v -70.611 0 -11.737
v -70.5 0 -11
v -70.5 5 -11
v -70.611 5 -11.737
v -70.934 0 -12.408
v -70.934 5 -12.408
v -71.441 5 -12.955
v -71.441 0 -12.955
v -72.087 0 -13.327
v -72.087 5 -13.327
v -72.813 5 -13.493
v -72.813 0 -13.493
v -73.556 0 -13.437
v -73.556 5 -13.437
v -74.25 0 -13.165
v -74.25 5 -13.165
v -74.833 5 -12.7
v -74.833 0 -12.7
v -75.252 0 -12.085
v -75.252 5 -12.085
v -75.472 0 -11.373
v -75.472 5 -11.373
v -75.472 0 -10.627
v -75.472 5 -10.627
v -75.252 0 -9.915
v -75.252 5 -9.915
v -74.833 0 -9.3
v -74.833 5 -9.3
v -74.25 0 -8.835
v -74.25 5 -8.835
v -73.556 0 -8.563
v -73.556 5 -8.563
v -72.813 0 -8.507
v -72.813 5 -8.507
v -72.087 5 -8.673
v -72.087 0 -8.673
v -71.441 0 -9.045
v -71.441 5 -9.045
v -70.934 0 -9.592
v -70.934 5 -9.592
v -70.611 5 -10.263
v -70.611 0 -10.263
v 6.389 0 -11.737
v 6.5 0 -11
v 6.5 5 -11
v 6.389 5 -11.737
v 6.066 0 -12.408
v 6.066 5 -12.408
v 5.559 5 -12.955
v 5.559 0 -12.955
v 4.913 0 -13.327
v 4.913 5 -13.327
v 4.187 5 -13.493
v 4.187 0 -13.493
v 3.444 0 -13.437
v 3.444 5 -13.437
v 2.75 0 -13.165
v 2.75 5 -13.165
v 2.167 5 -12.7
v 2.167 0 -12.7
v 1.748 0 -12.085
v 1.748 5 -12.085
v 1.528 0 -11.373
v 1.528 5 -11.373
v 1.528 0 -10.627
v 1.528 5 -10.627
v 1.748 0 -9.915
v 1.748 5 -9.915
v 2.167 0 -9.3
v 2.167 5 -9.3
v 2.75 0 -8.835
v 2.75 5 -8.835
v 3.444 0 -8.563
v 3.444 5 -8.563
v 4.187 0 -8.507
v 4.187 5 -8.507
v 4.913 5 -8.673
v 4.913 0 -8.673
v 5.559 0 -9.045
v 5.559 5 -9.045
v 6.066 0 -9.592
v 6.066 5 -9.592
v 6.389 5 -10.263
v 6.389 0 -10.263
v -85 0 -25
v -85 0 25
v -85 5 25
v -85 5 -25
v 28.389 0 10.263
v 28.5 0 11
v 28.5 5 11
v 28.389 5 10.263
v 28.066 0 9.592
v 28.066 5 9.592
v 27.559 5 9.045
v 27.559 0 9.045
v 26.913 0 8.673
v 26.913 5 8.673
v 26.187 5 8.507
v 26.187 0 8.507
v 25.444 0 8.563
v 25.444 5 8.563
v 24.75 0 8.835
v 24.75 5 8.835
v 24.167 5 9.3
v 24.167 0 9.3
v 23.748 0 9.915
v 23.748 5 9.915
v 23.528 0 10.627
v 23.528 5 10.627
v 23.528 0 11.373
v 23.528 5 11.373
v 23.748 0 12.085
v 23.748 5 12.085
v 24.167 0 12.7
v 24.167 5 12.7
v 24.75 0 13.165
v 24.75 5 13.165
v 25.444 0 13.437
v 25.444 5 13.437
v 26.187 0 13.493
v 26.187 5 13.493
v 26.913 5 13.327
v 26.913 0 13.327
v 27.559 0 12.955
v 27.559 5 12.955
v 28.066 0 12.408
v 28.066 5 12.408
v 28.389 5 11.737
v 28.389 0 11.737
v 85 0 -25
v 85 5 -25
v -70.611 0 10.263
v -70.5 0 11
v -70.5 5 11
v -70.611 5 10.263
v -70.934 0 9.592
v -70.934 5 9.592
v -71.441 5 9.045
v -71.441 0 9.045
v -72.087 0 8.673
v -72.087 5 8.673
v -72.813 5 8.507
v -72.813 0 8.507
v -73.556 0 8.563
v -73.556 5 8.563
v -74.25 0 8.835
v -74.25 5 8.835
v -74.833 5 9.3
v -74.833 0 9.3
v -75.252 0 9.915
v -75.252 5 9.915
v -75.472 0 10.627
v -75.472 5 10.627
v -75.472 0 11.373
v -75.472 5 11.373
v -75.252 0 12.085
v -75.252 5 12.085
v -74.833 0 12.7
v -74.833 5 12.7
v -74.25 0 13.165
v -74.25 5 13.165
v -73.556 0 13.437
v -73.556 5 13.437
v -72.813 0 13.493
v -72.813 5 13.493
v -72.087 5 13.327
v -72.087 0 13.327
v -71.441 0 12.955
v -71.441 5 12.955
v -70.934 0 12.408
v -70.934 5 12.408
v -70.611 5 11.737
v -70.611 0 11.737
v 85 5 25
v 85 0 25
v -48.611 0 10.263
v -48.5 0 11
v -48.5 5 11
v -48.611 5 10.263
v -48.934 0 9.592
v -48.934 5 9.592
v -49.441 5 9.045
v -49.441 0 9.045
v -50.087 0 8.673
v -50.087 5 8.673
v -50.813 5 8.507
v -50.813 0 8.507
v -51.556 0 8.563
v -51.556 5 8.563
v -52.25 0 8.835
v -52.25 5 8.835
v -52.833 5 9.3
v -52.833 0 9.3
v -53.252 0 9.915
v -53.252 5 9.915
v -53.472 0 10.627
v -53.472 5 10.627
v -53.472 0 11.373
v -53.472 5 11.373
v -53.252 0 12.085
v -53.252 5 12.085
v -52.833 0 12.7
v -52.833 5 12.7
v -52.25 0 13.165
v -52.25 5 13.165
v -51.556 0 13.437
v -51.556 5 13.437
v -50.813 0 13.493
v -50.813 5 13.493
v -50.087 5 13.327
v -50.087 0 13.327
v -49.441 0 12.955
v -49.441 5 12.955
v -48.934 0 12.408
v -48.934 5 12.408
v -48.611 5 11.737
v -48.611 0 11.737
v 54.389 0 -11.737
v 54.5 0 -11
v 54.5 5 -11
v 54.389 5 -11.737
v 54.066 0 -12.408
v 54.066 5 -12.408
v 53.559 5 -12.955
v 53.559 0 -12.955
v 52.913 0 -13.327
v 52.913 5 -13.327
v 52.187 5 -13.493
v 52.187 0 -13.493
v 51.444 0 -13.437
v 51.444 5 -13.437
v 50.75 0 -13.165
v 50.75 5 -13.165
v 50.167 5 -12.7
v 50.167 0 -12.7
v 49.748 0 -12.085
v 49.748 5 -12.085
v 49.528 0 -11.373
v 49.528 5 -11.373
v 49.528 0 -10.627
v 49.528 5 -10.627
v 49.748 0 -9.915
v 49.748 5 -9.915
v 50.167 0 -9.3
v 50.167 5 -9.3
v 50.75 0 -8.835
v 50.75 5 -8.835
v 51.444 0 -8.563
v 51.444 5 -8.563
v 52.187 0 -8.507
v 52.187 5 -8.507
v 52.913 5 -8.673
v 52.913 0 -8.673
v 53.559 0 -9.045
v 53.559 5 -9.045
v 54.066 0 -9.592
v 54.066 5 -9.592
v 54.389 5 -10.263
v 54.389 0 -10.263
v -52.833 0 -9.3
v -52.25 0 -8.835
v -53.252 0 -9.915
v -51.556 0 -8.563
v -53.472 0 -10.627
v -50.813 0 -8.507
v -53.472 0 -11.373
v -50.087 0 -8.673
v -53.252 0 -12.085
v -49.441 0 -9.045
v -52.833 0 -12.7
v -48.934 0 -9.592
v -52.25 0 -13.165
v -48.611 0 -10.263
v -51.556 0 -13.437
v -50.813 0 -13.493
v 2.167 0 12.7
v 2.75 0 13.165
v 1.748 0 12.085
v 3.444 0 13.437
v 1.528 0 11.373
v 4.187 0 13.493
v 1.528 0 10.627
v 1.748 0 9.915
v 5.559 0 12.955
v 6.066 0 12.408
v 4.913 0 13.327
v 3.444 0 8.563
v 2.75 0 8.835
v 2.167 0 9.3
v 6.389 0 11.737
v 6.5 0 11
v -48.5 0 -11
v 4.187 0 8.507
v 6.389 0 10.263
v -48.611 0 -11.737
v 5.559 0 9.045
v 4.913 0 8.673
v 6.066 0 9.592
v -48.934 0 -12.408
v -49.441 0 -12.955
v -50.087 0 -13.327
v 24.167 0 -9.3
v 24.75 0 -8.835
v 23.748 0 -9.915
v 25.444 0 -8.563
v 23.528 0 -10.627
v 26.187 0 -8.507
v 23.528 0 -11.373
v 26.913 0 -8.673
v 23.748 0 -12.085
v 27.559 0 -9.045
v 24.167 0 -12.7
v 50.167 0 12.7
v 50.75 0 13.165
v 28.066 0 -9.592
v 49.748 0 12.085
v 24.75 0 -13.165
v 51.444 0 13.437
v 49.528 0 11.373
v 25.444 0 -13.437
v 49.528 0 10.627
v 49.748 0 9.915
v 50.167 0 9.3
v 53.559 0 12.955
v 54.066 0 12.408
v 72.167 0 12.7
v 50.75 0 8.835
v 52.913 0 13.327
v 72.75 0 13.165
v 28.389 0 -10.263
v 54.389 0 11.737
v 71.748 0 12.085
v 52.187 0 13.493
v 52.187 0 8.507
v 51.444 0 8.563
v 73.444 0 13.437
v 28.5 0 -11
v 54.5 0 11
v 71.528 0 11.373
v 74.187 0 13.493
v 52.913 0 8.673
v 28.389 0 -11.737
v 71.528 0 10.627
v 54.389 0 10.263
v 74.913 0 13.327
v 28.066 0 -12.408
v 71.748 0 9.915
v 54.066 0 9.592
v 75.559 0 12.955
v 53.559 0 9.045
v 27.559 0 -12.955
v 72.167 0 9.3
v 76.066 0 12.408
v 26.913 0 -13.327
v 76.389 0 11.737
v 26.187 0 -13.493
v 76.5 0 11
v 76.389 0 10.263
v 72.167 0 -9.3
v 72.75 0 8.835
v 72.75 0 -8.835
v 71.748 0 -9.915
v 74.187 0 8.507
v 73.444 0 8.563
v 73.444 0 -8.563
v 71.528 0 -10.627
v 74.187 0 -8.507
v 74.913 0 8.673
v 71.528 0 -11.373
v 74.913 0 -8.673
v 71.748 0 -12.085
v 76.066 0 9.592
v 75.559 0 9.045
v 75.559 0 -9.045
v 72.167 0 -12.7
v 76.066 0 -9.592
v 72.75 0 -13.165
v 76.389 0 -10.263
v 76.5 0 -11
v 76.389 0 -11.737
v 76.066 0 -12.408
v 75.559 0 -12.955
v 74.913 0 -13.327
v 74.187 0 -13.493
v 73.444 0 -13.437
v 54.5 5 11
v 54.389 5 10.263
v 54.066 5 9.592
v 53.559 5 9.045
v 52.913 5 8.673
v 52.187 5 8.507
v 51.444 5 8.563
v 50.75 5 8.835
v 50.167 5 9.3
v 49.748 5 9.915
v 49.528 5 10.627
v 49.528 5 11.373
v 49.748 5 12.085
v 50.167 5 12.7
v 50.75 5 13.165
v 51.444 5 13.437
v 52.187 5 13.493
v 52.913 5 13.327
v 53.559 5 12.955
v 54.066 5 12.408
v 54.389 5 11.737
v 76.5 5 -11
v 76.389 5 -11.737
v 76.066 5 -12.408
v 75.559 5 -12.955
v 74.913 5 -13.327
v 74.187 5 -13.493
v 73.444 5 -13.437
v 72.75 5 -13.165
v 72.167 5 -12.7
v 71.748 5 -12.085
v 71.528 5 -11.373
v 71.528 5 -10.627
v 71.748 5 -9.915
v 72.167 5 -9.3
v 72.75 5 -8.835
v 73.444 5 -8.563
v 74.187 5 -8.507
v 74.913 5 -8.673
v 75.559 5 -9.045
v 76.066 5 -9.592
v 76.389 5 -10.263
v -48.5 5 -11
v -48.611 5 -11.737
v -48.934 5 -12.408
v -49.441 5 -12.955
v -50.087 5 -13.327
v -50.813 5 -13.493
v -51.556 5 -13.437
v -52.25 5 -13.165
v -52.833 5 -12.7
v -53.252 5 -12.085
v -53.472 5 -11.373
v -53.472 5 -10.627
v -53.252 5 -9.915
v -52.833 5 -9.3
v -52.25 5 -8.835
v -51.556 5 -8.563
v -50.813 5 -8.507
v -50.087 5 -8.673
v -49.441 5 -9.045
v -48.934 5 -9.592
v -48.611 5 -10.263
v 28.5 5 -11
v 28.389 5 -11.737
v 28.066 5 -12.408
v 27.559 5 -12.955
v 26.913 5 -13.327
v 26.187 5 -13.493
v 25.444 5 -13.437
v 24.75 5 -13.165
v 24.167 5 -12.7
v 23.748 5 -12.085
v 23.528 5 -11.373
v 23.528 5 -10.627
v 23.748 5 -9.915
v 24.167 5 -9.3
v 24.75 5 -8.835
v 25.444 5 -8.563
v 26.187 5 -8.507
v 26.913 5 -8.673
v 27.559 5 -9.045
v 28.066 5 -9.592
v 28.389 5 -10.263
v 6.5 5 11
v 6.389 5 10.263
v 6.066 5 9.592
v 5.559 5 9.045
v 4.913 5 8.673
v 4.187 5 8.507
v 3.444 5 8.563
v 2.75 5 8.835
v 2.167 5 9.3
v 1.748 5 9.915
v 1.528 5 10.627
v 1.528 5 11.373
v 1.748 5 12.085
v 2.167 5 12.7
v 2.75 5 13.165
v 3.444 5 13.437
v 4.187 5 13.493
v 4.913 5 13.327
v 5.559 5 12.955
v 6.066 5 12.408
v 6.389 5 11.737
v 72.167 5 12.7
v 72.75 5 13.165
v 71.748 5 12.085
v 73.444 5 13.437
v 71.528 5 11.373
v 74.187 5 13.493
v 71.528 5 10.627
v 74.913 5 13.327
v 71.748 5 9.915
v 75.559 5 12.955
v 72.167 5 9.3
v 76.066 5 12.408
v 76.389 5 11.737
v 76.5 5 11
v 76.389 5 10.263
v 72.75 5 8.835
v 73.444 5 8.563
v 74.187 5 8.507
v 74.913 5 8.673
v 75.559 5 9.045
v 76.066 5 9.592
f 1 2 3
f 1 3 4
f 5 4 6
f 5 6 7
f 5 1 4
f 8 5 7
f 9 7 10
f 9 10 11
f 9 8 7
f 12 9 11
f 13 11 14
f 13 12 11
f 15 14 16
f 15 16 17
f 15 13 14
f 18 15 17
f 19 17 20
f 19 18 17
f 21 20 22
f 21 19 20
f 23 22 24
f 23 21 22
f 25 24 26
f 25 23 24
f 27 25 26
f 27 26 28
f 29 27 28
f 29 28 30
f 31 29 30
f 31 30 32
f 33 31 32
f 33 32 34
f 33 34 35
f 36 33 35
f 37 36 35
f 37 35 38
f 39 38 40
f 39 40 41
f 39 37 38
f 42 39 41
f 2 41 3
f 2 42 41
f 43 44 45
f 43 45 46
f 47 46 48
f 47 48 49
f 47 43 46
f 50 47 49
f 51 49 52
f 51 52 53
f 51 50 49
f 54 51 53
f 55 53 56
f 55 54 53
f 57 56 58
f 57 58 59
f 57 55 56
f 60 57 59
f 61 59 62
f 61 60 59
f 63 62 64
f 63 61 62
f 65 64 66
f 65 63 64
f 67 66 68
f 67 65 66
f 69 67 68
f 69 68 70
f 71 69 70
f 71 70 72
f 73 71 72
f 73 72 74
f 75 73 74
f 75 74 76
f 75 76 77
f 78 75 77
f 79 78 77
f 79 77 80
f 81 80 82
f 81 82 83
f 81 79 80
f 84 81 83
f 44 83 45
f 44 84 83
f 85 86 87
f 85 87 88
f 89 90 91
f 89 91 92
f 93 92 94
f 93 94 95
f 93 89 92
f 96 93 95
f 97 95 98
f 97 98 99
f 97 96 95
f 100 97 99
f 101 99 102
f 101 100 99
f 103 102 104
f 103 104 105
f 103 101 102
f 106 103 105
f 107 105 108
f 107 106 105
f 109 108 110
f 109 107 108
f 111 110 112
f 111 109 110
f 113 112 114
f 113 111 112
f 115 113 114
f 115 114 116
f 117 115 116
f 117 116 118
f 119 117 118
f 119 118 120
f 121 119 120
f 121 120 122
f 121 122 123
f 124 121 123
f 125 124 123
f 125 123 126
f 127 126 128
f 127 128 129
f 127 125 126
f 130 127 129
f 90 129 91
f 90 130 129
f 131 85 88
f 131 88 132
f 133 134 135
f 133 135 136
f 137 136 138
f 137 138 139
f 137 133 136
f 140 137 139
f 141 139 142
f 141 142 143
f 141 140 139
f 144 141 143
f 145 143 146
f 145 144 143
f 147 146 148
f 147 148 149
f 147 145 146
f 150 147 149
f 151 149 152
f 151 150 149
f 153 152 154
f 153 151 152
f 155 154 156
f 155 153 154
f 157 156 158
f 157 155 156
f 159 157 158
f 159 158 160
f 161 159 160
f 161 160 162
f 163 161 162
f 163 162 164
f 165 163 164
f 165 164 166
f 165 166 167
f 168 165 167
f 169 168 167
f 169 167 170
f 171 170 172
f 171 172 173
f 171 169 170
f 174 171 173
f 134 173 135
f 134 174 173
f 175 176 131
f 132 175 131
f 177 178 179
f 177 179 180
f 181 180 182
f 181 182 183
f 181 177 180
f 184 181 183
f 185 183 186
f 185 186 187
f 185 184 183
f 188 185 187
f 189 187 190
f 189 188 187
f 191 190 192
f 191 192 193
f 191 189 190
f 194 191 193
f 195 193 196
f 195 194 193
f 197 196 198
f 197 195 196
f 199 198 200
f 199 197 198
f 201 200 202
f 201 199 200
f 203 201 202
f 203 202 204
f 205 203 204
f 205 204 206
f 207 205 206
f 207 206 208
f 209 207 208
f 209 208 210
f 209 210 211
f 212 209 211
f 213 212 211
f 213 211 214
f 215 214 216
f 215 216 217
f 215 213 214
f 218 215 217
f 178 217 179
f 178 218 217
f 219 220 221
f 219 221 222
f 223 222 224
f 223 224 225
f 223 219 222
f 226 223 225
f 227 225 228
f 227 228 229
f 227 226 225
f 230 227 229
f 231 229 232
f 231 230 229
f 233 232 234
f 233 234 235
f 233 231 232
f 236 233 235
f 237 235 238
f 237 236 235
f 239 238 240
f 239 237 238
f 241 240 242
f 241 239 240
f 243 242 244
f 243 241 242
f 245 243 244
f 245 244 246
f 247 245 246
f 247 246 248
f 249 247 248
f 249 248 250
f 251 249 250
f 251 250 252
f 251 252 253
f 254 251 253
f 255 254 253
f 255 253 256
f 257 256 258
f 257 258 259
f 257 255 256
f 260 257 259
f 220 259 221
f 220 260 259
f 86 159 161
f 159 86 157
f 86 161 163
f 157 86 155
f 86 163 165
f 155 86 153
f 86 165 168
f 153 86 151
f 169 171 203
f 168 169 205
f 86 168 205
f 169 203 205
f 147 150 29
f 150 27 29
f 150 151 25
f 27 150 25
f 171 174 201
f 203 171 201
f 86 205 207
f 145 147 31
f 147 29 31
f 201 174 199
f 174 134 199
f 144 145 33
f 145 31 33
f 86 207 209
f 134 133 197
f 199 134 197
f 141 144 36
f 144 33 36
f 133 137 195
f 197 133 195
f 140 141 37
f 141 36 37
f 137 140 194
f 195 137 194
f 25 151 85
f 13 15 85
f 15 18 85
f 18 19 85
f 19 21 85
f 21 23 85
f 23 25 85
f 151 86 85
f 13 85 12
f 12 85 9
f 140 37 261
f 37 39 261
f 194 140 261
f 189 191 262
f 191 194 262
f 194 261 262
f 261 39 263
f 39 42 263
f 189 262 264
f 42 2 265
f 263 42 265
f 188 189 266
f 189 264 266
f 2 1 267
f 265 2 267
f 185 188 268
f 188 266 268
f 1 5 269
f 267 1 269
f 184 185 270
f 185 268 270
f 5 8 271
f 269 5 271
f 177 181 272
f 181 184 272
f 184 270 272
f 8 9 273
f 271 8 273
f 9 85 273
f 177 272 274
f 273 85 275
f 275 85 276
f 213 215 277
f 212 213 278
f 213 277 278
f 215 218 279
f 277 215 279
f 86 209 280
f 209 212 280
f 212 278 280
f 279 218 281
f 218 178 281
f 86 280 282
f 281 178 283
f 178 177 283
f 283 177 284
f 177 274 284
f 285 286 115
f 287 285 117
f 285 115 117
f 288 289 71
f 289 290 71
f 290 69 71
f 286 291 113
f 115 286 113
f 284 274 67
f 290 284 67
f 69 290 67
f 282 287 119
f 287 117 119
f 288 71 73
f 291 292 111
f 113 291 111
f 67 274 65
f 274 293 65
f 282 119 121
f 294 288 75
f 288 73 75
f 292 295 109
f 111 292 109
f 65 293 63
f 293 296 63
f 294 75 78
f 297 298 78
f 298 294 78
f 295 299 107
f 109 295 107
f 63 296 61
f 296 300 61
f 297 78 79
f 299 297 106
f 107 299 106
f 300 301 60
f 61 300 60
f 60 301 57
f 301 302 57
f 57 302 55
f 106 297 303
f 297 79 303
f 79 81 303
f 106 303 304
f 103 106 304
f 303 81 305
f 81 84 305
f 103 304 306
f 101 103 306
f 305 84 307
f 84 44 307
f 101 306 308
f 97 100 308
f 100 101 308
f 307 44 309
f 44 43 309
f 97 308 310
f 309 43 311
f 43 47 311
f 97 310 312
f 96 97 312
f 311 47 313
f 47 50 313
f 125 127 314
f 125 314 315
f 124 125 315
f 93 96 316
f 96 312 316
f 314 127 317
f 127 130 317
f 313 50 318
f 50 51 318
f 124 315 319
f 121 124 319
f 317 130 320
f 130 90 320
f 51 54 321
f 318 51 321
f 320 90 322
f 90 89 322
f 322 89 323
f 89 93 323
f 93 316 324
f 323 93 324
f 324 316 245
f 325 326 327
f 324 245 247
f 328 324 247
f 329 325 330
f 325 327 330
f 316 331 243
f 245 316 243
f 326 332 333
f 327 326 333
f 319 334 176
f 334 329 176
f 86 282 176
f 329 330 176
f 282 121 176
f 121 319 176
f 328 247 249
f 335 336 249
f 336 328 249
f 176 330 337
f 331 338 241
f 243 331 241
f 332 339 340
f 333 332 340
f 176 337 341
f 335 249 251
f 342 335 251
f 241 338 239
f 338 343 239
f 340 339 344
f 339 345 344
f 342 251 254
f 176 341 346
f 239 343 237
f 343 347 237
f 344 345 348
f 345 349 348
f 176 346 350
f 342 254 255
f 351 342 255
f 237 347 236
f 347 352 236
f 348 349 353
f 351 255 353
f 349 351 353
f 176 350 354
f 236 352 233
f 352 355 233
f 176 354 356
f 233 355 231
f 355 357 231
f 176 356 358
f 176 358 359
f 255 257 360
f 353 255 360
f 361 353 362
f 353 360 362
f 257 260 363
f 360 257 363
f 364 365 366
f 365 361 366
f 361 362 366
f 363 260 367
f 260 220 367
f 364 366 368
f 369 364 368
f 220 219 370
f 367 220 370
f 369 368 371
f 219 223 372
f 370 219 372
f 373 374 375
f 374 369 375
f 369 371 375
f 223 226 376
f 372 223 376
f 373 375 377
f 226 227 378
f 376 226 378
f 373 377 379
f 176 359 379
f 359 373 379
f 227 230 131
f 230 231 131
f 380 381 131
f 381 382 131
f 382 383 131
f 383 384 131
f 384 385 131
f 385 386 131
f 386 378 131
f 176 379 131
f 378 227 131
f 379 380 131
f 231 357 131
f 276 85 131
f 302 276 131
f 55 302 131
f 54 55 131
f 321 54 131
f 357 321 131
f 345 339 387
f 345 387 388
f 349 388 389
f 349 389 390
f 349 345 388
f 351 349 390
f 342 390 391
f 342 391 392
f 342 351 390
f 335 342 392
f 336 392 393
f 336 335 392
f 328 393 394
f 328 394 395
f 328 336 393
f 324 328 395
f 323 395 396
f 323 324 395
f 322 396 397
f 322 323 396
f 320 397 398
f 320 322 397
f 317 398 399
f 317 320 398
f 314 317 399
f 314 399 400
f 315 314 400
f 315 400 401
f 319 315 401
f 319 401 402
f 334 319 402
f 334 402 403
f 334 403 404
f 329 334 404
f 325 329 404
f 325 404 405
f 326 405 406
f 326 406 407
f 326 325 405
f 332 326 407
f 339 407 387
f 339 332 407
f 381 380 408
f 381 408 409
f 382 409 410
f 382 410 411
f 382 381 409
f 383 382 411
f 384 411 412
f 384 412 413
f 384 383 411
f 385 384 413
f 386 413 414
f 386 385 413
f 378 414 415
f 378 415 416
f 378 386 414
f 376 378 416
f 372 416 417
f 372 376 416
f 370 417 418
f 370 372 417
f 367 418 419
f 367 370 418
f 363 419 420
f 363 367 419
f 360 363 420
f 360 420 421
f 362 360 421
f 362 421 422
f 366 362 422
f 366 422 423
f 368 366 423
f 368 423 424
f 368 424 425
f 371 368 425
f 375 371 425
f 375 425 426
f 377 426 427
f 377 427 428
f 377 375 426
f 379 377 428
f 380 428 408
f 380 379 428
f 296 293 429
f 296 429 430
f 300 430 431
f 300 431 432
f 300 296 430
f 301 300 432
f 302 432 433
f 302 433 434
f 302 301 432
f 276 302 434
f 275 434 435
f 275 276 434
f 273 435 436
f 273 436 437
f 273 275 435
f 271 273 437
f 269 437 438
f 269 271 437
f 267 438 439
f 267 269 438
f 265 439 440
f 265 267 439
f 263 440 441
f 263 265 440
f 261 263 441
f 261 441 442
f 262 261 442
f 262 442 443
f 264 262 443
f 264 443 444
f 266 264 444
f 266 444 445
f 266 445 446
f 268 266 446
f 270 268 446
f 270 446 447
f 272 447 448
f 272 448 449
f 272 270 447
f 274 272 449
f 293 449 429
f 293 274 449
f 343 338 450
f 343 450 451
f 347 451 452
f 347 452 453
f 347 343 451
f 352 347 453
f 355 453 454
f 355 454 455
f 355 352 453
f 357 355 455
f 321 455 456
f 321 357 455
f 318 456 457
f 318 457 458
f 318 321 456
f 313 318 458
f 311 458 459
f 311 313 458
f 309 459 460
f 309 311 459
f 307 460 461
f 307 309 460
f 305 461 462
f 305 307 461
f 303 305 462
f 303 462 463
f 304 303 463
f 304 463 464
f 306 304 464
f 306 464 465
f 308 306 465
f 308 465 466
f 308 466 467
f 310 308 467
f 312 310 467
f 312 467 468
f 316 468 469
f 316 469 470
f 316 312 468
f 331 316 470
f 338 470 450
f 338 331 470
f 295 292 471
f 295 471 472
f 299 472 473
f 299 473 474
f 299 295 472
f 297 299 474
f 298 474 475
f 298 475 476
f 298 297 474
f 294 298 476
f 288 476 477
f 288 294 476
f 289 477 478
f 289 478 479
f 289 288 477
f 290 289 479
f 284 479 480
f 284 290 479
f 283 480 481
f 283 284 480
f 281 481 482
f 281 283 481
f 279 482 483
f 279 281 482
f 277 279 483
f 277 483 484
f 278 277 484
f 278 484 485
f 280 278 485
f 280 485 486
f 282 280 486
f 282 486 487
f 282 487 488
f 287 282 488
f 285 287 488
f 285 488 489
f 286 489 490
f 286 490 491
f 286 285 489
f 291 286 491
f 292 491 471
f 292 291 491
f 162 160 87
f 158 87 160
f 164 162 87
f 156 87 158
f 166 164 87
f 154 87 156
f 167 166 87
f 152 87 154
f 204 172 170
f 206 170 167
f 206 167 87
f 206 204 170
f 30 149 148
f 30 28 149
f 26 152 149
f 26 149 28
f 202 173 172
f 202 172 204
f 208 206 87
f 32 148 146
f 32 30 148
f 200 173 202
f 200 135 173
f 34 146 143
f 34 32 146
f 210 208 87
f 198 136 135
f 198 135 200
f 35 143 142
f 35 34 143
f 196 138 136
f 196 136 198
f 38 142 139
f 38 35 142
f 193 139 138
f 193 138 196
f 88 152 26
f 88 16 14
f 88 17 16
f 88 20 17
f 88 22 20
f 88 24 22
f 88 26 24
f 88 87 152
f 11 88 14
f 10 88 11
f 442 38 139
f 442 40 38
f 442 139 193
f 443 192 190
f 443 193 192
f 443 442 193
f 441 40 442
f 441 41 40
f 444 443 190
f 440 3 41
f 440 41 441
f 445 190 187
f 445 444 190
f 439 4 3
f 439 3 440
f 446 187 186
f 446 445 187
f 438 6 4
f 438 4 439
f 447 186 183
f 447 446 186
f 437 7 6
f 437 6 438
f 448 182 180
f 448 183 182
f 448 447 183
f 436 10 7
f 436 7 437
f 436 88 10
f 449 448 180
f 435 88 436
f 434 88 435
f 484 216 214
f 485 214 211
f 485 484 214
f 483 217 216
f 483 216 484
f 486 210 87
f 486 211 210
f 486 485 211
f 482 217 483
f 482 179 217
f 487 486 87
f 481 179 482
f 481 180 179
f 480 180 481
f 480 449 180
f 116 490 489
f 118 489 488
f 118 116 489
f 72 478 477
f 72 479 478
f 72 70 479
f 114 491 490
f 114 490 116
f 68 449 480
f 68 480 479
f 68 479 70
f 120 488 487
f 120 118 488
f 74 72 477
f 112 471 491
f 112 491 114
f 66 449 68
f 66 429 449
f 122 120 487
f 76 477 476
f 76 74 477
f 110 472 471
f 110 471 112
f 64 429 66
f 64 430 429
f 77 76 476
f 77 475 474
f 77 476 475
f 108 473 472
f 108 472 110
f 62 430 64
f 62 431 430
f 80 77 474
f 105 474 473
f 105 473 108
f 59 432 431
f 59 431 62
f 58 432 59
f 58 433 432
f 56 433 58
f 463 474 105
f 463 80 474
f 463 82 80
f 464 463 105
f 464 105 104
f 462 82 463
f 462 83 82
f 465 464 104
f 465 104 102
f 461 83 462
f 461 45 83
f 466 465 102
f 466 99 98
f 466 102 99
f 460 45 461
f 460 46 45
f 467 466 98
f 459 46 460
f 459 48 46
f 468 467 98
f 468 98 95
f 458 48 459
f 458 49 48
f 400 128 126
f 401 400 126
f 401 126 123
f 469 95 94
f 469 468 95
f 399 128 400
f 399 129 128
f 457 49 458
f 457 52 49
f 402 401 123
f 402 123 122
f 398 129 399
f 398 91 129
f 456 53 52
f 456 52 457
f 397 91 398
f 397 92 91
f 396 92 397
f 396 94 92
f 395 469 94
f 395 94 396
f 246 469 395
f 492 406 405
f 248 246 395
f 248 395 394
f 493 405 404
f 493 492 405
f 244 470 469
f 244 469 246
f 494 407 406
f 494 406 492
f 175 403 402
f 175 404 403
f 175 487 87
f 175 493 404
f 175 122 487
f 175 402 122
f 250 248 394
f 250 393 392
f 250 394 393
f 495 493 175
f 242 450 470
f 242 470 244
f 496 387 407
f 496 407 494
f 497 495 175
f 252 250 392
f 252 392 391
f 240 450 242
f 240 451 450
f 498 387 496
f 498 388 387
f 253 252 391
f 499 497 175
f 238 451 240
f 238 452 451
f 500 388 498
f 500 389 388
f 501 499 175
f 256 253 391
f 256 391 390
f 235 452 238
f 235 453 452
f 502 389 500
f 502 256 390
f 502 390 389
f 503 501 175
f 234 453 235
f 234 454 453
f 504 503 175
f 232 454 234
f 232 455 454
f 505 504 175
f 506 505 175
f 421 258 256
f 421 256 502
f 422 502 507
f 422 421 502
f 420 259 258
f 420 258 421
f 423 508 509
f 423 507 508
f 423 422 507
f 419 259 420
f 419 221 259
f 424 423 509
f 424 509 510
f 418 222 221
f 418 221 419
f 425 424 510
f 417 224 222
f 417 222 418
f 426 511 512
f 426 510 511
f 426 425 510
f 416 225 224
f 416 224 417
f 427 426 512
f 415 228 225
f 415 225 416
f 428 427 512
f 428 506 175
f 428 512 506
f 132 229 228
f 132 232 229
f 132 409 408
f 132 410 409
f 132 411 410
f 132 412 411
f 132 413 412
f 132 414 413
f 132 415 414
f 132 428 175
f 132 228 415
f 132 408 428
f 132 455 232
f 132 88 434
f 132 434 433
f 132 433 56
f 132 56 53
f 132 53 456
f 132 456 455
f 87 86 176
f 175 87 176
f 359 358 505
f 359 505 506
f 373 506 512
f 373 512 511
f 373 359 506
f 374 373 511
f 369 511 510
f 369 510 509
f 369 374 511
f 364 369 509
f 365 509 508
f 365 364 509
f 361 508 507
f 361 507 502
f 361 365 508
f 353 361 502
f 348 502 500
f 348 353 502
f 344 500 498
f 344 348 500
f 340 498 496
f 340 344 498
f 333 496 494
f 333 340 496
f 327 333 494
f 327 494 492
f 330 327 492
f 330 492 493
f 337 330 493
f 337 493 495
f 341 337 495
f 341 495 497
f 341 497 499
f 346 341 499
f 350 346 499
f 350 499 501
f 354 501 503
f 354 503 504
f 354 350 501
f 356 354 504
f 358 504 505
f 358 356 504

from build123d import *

# Parameters (mm, degrees)
SKETCH1_W           = 170
SKETCH1_H           = 50
SKETCH1_R           = 2.5
BOSS_EXTRUDE1_DEPTH = 5


with BuildPart() as part:
    # Sketch1 → Boss-Extrude1 (new body)
    with BuildSketch(Plane(origin=(0, 0, 0), x_dir=(1, 0, 0), z_dir=(0, 1, 0))):
        Rectangle(SKETCH1_W, SKETCH1_H)
        with Locations((74, 11)):
            Circle(SKETCH1_R, mode=Mode.SUBTRACT)
        with Locations((52, 11)):
            Circle(SKETCH1_R, mode=Mode.SUBTRACT)
        with Locations((52, -11)):
            Circle(SKETCH1_R, mode=Mode.SUBTRACT)
        with Locations((74, -11)):
            Circle(SKETCH1_R, mode=Mode.SUBTRACT)
        with Locations((26, 11)):
            Circle(SKETCH1_R, mode=Mode.SUBTRACT)
        with Locations((4, 11)):
            Circle(SKETCH1_R, mode=Mode.SUBTRACT)
        with Locations((4, -11)):
            Circle(SKETCH1_R, mode=Mode.SUBTRACT)
        with Locations((26, -11)):
            Circle(SKETCH1_R, mode=Mode.SUBTRACT)
        with Locations((-51, 11)):
            Circle(SKETCH1_R, mode=Mode.SUBTRACT)
        with Locations((-73, 11)):
            Circle(SKETCH1_R, mode=Mode.SUBTRACT)
        with Locations((-51, -11)):
            Circle(SKETCH1_R, mode=Mode.SUBTRACT)
        with Locations((-73, -11)):
            Circle(SKETCH1_R, mode=Mode.SUBTRACT)
    extrude(amount=BOSS_EXTRUDE1_DEPTH)


solid = part.part
